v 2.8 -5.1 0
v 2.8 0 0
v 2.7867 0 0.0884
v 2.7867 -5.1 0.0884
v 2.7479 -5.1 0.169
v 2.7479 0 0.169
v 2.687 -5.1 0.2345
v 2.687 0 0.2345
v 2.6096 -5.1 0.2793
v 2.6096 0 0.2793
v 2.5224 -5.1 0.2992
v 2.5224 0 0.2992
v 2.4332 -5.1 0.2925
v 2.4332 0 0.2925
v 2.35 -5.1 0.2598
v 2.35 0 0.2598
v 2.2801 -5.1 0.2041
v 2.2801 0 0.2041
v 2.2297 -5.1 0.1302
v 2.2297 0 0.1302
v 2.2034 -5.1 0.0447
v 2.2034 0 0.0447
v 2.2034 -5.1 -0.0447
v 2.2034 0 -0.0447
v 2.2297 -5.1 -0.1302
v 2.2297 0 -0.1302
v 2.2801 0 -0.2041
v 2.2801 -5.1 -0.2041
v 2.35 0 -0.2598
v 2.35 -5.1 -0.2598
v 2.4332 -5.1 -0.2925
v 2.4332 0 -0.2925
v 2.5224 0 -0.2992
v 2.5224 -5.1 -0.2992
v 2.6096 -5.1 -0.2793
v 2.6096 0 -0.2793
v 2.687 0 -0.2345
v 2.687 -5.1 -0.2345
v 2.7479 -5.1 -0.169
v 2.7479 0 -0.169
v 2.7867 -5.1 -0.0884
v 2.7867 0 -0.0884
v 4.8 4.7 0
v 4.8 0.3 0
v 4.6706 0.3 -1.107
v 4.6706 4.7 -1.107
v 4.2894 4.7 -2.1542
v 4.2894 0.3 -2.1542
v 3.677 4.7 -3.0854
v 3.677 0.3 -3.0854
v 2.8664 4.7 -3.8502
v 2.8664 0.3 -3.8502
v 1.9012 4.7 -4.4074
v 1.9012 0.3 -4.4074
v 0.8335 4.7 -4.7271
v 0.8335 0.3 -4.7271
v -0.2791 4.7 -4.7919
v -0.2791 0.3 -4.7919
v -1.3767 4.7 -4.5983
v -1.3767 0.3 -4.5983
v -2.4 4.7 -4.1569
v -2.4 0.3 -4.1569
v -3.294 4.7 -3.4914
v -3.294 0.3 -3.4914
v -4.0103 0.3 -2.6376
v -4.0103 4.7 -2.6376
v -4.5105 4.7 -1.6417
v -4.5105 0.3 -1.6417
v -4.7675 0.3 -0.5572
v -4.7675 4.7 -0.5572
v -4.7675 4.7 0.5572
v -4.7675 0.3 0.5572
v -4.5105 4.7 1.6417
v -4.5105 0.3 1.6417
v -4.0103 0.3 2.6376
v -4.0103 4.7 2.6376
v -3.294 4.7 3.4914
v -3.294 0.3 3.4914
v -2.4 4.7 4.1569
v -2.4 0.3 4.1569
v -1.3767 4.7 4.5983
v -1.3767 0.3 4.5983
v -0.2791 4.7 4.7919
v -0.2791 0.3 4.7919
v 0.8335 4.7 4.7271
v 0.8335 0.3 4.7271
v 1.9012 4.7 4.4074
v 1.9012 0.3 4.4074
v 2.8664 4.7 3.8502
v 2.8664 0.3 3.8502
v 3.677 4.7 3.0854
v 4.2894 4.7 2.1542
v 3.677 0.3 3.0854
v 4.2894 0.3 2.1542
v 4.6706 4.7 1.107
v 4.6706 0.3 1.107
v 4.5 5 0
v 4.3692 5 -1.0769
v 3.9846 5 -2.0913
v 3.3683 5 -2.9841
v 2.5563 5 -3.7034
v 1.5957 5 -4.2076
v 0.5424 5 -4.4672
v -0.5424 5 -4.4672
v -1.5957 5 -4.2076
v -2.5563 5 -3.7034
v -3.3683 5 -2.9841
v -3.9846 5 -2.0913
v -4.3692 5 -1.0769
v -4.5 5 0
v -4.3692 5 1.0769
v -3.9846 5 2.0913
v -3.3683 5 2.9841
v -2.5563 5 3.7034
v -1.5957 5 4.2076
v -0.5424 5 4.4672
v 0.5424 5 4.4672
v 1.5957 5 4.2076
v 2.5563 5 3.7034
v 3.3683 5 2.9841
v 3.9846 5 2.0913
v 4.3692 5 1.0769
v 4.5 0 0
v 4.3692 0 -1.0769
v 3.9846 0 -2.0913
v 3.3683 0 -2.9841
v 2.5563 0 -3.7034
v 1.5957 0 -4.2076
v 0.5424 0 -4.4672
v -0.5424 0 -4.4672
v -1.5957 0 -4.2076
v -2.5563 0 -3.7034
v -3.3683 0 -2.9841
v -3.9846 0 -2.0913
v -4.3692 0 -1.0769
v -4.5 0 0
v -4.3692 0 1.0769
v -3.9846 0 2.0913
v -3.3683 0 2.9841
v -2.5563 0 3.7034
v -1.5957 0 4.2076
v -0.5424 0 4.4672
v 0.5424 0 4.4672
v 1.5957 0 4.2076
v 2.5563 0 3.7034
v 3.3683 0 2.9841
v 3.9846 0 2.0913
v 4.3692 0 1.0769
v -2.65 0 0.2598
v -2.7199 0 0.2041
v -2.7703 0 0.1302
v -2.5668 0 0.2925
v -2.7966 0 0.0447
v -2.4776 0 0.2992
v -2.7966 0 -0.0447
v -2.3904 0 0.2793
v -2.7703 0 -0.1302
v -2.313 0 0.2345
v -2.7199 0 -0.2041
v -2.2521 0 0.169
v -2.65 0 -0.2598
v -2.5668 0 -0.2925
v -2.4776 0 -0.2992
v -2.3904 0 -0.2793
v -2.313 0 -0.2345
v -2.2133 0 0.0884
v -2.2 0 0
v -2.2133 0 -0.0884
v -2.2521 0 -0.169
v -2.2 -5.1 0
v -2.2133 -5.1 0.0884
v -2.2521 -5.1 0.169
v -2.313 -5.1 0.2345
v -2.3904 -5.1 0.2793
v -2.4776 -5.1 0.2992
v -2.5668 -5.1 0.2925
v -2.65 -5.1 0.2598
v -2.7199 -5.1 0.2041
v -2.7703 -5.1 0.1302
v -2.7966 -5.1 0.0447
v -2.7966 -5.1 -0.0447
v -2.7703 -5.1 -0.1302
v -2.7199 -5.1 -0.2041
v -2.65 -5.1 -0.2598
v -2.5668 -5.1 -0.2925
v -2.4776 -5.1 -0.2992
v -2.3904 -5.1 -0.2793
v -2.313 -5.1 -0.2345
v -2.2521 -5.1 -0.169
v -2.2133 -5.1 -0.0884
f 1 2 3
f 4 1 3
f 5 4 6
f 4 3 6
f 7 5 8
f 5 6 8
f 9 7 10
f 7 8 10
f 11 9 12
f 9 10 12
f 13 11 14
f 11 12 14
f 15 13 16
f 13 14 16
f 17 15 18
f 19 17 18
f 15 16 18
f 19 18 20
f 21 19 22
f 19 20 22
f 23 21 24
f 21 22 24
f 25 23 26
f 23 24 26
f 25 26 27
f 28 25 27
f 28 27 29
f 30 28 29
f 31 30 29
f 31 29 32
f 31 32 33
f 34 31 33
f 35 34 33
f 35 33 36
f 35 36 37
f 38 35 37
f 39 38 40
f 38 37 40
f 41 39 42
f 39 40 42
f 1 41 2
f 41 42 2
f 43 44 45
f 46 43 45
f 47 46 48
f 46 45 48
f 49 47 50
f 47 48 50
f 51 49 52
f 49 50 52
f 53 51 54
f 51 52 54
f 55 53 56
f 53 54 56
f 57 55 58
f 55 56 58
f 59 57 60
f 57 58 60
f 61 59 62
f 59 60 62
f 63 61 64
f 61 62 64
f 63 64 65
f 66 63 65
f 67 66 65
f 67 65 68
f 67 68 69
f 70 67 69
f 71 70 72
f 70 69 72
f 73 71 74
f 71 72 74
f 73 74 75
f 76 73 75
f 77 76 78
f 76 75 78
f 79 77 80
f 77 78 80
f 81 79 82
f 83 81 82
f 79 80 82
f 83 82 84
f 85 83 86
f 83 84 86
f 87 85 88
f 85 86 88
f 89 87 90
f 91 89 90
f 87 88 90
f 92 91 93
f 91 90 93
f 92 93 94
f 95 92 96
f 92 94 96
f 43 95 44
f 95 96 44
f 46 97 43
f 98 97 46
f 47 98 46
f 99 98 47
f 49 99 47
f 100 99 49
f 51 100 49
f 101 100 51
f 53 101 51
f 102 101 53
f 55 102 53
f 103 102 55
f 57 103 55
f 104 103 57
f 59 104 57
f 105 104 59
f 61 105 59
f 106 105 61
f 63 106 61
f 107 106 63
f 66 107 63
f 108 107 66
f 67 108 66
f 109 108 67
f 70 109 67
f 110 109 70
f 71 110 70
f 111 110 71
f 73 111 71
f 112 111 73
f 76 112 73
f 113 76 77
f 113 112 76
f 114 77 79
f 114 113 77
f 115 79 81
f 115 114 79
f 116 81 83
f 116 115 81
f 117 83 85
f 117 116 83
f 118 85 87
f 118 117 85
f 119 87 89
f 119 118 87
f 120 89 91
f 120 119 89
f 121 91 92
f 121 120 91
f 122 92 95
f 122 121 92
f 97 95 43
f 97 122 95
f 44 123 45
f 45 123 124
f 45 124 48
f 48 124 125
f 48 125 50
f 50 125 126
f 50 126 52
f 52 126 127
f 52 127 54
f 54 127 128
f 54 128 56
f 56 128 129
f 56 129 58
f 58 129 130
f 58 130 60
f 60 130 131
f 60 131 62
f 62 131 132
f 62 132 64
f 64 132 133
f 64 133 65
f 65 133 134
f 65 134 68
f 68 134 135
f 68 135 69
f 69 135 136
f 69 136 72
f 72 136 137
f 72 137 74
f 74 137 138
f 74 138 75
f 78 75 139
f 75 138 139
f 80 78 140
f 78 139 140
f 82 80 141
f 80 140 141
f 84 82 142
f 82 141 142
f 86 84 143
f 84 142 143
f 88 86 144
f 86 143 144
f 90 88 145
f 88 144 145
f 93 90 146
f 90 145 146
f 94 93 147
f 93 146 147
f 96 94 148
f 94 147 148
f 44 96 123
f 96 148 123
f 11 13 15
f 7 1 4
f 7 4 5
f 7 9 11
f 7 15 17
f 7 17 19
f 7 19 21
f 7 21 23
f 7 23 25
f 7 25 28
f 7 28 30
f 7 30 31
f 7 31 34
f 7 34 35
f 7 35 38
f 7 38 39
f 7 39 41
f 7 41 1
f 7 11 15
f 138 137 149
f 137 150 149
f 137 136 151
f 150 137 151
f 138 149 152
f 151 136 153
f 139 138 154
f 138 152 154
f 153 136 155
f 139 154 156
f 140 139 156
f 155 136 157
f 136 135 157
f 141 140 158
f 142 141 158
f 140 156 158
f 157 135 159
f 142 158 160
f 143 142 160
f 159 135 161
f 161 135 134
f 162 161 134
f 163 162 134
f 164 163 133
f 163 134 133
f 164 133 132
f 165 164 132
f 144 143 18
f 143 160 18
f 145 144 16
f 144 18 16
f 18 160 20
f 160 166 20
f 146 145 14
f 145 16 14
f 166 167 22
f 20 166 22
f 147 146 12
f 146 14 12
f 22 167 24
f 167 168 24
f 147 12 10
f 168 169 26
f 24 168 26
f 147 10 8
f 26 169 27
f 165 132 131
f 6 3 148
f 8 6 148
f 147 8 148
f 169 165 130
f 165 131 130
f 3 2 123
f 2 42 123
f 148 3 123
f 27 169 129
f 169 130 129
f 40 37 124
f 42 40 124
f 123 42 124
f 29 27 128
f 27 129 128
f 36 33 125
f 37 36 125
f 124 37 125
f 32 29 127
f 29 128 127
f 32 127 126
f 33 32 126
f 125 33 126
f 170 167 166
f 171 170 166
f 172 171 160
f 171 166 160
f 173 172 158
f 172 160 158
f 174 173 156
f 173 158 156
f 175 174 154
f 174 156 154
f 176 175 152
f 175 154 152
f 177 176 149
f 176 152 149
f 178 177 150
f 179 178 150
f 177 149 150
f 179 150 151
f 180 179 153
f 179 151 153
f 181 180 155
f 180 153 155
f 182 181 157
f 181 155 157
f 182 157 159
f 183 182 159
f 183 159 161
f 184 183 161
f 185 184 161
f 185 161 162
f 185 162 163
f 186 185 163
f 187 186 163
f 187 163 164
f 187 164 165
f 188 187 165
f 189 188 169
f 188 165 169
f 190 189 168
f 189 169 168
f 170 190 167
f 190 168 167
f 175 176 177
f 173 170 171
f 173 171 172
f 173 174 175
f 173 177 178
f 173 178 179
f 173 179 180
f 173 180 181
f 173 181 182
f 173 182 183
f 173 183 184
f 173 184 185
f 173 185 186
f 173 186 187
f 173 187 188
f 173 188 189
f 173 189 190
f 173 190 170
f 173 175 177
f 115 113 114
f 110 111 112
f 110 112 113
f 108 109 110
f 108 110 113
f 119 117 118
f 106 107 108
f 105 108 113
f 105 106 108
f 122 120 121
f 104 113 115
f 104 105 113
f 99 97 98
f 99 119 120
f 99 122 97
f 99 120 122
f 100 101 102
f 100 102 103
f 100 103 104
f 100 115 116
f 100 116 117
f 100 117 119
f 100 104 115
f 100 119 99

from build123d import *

# Parameters (mm, degrees)
SKETCH_1_R      = 4.8
EXTRUDE_1_DEPTH = 5
CHAMFER_1_SIZE  = 0.3
SKETCH_2_R      = 0.3
EXTRUDE_2_DEPTH = 5.1


with BuildPart() as part:
    # 草图1 → 凸台-拉伸1 (new body)
    with BuildSketch(Plane(origin=(0, 0, 0), x_dir=(1, 0, 0), z_dir=(0, 1, 0))):
        Circle(SKETCH_1_R)
    extrude(amount=EXTRUDE_1_DEPTH)

    # 倒角1
    chamfer_1_edges = [part.edges().sort_by_distance(p)[0] for p in [
        (-4.8, 0, 0),
        (-4.8, 5, 0),
    ]]
    chamfer(chamfer_1_edges, length=CHAMFER_1_SIZE)

    # 草图2 → 凸台-拉伸2 (add)
    with BuildSketch(Plane.XZ):
        with Locations((-2.5, 0)):
            Circle(SKETCH_2_R)
        with Locations((2.5, 0)):
            Circle(SKETCH_2_R)
    extrude(amount=EXTRUDE_2_DEPTH)


solid = part.part
